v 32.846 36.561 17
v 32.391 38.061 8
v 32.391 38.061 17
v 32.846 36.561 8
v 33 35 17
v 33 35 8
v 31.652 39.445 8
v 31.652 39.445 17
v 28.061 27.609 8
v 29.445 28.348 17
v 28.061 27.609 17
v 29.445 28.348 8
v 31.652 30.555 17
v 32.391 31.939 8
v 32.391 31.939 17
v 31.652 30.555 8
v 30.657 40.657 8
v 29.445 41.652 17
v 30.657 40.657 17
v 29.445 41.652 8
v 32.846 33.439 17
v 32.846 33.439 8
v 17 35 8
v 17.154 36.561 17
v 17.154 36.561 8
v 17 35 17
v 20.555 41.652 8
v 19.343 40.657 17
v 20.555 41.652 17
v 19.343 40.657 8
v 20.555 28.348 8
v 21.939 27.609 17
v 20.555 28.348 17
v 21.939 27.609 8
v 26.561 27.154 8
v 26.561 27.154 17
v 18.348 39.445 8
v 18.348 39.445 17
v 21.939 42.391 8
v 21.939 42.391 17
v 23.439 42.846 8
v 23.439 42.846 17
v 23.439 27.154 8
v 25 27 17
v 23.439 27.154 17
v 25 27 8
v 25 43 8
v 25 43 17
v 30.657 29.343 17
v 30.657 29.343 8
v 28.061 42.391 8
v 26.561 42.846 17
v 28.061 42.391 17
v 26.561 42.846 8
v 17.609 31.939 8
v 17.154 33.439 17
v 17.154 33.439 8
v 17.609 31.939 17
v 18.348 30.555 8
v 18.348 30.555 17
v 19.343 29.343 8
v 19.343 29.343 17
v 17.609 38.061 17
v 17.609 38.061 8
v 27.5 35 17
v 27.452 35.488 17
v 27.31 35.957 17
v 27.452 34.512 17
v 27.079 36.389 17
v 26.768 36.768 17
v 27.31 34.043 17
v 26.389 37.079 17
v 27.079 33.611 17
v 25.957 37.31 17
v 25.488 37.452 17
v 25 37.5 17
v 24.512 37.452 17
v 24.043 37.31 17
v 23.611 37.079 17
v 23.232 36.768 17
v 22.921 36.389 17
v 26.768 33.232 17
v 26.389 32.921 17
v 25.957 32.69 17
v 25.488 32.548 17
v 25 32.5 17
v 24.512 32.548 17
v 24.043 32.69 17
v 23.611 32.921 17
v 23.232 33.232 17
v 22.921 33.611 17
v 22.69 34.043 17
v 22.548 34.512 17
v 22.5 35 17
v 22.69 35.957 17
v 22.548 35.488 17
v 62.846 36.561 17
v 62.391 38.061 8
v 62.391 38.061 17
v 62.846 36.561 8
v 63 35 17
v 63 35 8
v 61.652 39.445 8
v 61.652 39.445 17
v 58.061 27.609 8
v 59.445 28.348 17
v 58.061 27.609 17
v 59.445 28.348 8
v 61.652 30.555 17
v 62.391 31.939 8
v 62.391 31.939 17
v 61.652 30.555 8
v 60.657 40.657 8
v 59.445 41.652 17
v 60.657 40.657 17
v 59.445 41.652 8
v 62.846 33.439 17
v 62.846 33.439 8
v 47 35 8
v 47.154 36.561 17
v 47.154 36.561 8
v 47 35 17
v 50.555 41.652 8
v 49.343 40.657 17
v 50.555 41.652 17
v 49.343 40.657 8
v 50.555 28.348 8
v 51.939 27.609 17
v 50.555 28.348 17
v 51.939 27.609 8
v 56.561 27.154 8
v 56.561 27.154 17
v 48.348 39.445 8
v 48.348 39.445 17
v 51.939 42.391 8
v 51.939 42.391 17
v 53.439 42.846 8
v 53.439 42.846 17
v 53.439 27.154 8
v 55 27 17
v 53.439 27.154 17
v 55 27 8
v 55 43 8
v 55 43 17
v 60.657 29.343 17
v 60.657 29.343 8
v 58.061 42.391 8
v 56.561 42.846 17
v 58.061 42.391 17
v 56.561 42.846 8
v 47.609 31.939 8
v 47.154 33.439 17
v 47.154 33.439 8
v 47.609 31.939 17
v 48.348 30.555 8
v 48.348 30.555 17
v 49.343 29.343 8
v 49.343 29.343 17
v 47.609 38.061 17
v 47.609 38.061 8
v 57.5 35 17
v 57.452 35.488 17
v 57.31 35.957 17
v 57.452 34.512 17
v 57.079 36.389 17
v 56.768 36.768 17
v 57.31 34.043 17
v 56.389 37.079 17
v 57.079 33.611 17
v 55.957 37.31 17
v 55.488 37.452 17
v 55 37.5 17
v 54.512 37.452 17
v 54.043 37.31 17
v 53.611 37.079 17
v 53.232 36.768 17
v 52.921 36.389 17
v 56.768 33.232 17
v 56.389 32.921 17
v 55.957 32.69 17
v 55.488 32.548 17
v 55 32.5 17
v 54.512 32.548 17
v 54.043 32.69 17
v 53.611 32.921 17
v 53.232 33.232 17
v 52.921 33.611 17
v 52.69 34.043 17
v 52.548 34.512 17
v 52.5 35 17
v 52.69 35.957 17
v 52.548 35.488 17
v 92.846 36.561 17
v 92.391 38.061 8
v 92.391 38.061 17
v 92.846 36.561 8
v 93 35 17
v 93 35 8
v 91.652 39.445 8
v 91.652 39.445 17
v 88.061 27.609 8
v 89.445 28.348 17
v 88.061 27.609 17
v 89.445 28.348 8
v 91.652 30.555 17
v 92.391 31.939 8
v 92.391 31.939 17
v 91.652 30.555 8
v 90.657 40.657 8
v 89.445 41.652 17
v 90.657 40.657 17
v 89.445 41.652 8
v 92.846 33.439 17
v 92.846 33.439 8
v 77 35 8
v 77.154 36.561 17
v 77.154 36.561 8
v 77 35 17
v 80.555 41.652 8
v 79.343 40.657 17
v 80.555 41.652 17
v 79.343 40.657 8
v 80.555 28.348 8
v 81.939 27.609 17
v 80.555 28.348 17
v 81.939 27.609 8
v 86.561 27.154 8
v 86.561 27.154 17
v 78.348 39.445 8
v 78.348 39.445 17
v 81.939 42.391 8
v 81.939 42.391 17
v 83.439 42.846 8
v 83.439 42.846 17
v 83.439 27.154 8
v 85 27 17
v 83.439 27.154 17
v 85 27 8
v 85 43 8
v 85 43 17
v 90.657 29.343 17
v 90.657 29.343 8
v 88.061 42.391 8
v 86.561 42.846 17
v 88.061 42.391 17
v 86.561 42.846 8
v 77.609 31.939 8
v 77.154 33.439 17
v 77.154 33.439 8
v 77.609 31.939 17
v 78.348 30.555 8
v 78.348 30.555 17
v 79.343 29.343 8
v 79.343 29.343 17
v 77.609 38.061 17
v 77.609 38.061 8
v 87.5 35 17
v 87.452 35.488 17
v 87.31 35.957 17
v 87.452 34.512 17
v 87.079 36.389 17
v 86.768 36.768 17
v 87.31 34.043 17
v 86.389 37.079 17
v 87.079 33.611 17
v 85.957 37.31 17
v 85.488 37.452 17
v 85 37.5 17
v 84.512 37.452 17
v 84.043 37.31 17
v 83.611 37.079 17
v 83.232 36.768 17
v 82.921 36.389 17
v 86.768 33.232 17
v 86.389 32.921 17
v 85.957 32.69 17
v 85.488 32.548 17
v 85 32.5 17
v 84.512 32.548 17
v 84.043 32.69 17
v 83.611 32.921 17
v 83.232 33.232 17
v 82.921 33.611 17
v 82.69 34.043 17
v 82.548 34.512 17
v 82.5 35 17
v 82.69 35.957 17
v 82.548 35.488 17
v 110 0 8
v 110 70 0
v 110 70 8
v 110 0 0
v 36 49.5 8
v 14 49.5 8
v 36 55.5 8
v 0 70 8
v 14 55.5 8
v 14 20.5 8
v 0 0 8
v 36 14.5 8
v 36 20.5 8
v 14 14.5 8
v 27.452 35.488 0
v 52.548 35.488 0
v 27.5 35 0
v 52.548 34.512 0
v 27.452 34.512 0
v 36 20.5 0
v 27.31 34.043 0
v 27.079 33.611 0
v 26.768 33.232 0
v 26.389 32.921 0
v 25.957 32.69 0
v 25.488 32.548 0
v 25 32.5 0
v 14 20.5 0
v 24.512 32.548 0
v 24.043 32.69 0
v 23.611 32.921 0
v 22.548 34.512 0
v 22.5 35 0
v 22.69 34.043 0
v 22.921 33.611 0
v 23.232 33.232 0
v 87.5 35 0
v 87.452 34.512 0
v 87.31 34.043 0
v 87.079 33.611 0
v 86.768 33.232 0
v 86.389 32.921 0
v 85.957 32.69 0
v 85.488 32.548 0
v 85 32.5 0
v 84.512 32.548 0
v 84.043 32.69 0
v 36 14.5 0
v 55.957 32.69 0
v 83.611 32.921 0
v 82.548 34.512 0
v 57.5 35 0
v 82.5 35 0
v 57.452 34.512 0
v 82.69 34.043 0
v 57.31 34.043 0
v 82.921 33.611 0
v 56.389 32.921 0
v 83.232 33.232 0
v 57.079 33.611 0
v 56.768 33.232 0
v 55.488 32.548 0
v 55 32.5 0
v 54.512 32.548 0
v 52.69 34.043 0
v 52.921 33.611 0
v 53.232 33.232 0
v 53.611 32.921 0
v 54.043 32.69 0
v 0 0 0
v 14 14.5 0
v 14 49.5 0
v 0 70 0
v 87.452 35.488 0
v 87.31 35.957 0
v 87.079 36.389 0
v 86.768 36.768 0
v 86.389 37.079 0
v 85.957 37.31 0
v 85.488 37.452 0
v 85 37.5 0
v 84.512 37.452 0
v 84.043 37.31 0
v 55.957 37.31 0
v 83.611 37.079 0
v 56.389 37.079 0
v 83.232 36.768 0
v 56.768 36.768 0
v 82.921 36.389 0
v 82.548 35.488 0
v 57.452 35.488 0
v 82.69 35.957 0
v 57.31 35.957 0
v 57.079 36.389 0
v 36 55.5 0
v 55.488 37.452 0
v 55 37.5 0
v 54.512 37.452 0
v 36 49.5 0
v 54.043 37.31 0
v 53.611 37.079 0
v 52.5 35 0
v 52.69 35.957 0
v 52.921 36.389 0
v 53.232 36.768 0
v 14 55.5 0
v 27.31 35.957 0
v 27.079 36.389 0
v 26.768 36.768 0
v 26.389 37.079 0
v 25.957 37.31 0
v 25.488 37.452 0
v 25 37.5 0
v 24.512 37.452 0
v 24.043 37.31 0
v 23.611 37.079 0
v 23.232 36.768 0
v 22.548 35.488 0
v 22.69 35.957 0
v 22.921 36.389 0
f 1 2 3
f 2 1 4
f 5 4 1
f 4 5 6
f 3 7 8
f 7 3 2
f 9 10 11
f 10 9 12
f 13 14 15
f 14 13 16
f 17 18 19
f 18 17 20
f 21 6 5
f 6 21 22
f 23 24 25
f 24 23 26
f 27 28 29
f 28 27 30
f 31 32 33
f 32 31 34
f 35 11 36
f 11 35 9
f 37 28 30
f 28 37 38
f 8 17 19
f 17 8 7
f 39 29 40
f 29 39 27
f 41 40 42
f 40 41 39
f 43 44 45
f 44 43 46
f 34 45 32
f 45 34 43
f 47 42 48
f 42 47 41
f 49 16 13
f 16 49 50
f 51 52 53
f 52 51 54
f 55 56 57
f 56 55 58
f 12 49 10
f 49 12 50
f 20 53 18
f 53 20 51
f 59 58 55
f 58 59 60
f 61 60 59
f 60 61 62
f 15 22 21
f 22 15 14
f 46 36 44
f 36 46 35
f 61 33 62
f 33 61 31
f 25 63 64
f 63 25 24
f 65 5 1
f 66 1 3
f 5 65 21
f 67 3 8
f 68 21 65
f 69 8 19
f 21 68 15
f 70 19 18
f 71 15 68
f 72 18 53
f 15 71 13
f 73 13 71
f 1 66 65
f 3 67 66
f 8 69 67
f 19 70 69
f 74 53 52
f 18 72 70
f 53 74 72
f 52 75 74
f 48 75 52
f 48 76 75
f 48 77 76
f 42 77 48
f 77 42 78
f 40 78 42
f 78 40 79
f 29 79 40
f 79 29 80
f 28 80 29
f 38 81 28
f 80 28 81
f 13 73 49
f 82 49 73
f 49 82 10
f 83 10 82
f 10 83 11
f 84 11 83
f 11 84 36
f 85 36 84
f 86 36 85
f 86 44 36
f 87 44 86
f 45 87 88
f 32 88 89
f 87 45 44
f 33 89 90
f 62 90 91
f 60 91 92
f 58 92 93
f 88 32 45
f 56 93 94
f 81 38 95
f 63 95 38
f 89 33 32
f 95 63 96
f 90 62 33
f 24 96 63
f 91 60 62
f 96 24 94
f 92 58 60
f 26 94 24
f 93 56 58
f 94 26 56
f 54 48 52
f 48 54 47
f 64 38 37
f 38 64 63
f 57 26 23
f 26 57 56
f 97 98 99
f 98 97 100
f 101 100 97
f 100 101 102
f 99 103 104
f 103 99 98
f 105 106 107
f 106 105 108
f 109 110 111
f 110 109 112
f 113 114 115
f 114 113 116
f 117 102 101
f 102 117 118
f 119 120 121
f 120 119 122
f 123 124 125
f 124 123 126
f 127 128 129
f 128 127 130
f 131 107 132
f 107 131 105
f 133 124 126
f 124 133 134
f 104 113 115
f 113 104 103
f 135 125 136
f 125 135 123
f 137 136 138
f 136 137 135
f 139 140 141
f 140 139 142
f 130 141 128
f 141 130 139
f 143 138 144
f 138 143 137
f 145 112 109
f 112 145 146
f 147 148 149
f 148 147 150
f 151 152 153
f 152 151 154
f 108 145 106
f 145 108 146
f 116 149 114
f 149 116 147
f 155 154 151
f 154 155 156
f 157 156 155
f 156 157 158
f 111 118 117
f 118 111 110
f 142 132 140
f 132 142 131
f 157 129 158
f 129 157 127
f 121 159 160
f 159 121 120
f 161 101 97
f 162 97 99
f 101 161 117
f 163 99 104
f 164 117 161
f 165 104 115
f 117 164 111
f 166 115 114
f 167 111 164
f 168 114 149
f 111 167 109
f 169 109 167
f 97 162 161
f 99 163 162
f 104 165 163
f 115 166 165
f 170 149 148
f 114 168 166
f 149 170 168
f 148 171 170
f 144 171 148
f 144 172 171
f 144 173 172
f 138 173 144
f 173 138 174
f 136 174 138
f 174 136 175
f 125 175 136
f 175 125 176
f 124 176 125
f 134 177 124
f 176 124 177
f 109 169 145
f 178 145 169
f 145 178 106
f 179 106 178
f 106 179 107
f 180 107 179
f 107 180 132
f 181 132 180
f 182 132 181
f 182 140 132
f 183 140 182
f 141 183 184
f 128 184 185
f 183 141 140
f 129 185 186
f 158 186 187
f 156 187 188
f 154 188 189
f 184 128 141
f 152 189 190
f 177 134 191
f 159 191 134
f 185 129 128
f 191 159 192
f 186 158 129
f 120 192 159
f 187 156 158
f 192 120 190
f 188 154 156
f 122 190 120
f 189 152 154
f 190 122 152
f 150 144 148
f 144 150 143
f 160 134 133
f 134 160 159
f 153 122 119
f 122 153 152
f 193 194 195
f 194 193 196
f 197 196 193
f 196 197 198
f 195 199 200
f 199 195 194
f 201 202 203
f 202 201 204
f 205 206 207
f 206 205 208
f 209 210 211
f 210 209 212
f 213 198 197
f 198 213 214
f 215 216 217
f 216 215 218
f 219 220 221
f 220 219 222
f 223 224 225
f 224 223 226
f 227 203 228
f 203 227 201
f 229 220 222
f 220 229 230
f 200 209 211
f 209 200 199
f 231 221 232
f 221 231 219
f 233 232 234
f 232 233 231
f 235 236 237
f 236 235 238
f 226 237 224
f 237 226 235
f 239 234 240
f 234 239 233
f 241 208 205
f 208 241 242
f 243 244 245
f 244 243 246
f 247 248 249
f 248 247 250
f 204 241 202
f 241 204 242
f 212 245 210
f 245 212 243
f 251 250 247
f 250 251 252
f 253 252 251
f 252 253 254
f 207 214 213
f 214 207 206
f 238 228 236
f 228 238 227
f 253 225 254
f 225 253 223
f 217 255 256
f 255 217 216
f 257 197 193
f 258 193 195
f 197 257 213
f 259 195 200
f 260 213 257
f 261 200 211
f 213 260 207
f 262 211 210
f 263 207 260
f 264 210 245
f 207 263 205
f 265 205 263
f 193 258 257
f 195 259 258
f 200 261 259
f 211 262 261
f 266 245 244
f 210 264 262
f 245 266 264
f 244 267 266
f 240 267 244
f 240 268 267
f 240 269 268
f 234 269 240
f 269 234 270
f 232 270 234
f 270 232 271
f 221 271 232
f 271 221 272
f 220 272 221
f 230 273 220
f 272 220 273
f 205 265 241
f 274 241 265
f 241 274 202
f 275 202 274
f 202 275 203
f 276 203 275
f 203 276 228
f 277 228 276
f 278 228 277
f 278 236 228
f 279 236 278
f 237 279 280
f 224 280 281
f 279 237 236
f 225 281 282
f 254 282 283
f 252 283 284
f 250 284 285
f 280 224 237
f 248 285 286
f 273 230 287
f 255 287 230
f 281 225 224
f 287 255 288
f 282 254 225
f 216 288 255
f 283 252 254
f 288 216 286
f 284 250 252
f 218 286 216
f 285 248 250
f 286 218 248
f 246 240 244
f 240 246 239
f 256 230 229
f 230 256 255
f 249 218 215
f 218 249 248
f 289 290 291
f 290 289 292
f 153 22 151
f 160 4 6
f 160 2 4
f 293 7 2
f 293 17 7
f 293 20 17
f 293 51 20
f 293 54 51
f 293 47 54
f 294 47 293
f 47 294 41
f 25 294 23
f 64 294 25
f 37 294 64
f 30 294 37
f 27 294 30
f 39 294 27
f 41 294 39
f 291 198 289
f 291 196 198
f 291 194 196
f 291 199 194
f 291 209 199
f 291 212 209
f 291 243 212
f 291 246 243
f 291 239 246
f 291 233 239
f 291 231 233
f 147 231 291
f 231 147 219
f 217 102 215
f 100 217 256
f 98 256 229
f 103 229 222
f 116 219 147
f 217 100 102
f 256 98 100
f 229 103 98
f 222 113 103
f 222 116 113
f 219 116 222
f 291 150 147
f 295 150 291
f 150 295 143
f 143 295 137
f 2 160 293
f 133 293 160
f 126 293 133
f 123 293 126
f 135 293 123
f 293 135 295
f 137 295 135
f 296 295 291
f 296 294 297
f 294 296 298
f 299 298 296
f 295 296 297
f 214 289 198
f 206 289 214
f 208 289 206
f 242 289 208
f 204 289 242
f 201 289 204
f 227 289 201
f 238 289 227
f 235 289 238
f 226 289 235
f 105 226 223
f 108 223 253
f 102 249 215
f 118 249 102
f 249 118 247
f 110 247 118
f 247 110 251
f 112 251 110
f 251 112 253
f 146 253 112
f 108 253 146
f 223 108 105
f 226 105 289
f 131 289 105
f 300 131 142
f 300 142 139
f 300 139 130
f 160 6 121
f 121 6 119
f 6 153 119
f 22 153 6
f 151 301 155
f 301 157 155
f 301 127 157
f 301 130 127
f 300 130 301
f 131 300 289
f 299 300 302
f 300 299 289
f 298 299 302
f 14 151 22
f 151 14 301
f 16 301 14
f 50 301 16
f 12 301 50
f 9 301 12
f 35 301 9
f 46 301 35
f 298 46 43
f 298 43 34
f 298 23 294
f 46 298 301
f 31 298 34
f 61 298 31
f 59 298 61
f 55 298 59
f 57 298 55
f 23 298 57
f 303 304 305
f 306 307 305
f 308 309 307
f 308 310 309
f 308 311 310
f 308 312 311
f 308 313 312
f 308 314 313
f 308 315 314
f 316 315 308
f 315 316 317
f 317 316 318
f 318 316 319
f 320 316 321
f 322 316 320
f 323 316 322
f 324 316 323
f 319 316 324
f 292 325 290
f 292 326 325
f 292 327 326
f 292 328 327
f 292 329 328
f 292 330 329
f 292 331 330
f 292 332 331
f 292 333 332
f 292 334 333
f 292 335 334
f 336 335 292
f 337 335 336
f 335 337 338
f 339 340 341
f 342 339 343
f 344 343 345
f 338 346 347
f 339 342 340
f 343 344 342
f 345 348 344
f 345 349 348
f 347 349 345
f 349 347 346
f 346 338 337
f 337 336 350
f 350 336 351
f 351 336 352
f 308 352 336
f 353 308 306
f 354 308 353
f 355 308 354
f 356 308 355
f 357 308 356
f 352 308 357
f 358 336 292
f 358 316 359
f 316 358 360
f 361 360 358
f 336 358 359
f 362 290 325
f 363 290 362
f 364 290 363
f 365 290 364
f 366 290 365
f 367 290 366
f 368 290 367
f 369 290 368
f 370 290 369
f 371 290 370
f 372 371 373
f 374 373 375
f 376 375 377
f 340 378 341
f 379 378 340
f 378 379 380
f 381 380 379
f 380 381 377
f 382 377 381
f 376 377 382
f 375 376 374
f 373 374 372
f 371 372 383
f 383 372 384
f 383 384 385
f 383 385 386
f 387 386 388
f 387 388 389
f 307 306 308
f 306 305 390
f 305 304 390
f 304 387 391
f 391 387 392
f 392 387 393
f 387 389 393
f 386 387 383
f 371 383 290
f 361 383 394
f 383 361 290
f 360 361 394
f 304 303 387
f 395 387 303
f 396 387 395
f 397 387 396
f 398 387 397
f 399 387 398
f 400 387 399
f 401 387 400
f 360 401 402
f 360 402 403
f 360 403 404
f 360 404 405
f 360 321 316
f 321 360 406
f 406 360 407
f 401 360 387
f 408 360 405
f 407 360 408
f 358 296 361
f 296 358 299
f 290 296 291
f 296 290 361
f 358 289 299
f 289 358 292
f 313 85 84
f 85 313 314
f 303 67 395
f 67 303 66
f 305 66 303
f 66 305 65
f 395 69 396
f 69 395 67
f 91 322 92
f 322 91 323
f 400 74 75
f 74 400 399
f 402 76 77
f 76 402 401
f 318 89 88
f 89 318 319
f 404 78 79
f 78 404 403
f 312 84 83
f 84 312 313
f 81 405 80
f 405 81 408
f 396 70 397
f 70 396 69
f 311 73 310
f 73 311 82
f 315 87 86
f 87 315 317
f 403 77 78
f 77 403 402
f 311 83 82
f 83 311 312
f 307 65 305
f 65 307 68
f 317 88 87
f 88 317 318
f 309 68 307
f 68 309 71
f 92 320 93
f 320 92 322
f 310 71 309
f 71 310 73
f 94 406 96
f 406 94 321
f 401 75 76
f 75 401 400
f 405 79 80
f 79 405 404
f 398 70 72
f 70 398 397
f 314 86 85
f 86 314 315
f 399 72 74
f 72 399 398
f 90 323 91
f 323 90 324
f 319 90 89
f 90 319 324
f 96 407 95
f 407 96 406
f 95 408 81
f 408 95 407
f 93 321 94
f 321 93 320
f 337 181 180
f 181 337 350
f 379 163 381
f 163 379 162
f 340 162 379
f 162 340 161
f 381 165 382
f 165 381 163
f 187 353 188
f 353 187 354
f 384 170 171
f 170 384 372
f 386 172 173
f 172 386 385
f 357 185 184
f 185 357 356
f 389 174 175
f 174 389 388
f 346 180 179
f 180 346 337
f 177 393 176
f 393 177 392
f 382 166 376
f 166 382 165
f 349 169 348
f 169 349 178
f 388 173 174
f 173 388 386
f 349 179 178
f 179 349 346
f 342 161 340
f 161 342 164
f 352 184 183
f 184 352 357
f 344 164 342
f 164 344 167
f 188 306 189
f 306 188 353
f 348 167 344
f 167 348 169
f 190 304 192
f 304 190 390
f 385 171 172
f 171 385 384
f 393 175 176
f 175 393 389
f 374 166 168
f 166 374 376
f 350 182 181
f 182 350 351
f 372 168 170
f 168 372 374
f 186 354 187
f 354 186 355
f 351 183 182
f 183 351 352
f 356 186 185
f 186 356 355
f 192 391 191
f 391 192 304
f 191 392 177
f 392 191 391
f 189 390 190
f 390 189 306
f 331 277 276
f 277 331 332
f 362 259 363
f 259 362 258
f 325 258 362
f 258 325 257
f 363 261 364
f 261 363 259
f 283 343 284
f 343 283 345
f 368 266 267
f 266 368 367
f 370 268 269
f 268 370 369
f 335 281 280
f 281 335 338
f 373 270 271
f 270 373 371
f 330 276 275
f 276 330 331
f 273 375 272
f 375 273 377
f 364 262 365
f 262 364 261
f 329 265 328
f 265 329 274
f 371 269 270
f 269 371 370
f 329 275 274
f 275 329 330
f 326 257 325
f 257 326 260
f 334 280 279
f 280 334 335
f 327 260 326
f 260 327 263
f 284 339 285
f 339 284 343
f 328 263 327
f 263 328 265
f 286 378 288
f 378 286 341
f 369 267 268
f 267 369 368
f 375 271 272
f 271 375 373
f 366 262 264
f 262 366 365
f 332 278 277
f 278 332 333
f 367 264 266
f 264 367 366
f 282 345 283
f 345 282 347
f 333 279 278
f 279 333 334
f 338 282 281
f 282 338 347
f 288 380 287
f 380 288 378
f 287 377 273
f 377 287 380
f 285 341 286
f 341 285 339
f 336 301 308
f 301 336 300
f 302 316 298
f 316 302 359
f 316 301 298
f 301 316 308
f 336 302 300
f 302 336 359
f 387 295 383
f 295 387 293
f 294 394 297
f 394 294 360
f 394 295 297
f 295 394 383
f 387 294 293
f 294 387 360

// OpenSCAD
$fn = 32;

// ----------------------------------------------------------------------
// Drill jig: three_boss_slot jig
// ----------------------------------------------------------------------

// --- parameters (mm) ---
plate_l = 110;            // plate length, X
plate_w = 70;             // plate width, Y
plate_t = 8;              // plate thickness
boss_d = 16;              // guide boss diameter
boss_h = 10;              // boss height above the plate
guide_d = 5;              // guide hole diameter
boss_pitch = 30;          // boss pitch
slot_w = 6;               // clamp slot width
slot_l = 22;              // clamp slot length
slot_x = 14;              // slot start X
fit_tol = 0.05;           // tolerance for press fits, mm
free_tol = 0.2;           // tolerance for clearance fits, mm

n_boss = 3;  // guide bosses
boss_x0 = (plate_l - (n_boss - 1) * boss_pitch) / 2;  // first boss X
boss_top = plate_t - 1 + boss_h;  // boss crown height
total_h = boss_top;  // overall height

difference() {
  union() {
  cube([plate_l, plate_w, plate_t]);
  for (i = [0 : n_boss - 1])
    translate([boss_x0 + i * boss_pitch, plate_w / 2, plate_t - 1])
      cylinder(h = boss_h, d = boss_d);
  }
  for (i = [0 : n_boss - 1])
    translate([boss_x0 + i * boss_pitch, plate_w / 2, -1])
      cylinder(h = plate_t + boss_h, d = guide_d);
  for (cy = [plate_w * 0.25, plate_w * 0.75])
    translate([slot_x, cy - slot_w / 2, -1])
      cube([slot_l, slot_w, plate_t + 2]);
}
